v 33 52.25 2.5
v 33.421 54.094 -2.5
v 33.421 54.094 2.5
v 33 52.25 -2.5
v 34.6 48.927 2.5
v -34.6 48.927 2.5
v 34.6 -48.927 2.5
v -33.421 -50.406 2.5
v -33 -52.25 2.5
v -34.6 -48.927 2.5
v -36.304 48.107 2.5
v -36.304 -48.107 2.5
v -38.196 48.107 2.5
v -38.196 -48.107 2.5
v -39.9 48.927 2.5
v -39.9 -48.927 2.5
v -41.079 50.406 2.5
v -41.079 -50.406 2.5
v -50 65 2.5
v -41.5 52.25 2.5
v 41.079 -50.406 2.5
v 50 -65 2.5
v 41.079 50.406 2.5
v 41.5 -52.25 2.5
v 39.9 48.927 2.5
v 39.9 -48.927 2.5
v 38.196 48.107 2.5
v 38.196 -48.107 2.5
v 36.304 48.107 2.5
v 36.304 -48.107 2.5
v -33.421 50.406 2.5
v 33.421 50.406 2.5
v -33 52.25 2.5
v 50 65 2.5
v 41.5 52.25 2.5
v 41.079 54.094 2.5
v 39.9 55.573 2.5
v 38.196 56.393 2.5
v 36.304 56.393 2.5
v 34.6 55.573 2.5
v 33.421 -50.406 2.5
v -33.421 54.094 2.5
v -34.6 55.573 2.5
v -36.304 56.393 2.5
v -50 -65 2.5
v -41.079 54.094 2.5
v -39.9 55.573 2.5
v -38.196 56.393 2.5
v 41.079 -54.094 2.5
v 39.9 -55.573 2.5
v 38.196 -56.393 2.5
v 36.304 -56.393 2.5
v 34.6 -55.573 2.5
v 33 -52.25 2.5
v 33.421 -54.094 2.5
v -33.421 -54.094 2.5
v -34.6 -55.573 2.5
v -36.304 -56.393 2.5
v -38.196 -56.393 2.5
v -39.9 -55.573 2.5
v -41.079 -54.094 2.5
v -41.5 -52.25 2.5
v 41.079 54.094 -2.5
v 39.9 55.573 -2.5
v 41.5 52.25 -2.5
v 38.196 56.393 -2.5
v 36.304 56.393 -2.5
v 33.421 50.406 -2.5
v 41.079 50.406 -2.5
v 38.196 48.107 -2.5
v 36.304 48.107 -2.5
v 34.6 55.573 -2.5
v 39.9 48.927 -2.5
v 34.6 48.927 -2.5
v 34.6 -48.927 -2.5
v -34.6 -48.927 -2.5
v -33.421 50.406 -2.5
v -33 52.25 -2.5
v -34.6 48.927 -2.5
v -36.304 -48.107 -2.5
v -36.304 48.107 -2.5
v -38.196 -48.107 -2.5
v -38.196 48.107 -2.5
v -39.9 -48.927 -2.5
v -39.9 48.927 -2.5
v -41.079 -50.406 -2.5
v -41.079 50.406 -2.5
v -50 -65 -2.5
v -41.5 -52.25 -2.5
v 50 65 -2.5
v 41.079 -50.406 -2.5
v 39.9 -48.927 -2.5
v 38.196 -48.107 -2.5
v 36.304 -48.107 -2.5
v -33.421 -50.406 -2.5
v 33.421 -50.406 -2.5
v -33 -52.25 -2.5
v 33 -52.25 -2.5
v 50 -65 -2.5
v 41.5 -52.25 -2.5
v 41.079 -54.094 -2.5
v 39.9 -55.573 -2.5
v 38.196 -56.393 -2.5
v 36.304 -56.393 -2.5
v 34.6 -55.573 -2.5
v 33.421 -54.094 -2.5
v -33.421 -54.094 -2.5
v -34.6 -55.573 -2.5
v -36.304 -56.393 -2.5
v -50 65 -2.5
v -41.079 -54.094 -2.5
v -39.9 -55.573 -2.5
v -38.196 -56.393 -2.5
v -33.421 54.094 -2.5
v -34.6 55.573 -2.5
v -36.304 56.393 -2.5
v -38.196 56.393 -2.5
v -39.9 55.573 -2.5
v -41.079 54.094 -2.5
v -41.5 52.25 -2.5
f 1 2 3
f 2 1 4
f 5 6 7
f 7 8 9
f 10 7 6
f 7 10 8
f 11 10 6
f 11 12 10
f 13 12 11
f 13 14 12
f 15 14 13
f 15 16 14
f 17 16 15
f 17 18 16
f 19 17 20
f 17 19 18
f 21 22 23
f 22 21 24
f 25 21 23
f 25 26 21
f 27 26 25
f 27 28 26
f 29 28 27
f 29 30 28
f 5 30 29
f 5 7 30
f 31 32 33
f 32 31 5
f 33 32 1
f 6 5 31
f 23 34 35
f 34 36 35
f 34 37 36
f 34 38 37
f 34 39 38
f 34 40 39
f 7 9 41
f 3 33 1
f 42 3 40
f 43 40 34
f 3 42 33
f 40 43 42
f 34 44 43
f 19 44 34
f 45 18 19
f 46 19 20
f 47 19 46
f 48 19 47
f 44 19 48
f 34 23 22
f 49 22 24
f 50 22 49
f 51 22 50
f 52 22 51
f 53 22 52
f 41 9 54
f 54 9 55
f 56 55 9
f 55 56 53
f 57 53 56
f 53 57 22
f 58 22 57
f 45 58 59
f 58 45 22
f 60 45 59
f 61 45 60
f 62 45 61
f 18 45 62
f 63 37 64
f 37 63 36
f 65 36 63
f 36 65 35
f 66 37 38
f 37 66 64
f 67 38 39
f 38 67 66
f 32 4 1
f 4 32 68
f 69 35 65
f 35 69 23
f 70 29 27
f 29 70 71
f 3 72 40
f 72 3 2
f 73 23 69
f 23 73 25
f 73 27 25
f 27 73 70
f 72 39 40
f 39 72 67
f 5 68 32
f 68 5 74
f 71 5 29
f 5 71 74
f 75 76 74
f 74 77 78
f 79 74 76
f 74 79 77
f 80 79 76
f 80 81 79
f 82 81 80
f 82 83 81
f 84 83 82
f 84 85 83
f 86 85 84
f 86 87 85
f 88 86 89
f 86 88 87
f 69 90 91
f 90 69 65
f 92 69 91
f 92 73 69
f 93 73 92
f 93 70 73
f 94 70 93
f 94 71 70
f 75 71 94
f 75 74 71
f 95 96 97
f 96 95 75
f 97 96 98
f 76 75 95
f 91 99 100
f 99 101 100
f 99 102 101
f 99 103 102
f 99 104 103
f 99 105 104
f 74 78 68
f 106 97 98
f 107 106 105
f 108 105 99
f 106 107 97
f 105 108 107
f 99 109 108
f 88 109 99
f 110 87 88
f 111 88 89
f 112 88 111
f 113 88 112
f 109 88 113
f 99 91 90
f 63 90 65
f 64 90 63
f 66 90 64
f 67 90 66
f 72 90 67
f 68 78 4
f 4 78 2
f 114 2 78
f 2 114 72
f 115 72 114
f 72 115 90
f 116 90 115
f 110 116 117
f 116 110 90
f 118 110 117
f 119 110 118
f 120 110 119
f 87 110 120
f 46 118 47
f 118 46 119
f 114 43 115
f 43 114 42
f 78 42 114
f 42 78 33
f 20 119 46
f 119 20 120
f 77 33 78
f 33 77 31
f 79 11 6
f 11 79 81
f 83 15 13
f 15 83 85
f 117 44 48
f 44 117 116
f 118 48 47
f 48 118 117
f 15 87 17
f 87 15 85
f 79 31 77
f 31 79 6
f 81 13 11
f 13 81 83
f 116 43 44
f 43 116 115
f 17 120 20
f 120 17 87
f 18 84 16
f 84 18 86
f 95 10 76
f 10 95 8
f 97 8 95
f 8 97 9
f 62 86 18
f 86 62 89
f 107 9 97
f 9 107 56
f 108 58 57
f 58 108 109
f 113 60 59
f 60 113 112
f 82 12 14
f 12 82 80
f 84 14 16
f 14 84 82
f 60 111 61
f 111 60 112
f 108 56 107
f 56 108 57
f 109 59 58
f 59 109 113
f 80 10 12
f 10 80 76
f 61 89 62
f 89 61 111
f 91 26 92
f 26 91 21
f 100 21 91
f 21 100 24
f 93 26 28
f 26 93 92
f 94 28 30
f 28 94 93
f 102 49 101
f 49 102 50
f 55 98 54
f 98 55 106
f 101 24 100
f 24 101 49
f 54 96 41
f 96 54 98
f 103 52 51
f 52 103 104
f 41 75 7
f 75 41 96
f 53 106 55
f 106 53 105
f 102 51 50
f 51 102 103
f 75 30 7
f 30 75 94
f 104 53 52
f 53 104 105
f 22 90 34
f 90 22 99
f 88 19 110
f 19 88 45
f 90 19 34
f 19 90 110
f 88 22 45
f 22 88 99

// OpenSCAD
// Generated by SolidPython 1.1.3 on 2023-07-11 01:34:08


difference() {
	cube(center = true, size = [100, 130.0000000000, 5]);
	union() {
		translate(v = [37.2500000000, 52.2500000000]) {
			cylinder(center = true, h = 5, r = 4.2500000000);
		}
		translate(v = [-37.2500000000, 52.2500000000]) {
			cylinder(center = true, h = 5, r = 4.2500000000);
		}
		translate(v = [-37.2500000000, -52.2500000000]) {
			cylinder(center = true, h = 5, r = 4.2500000000);
		}
		translate(v = [37.2500000000, -52.2500000000]) {
			cylinder(center = true, h = 5, r = 4.2500000000);
		}
	}
}
/***********************************************
*********      SolidPython code:      **********
************************************************
 
import solid
import numbers
import pudb
from solid.utils import *
import viewscad
import subprocess
import os
import os.path as osp
import math
import sys

chamfer_extrude=solid.import_scad("./chamfer_extrude.scad")
chamfer_extrude=chamfer_extrude.chamfer_extrude
r = viewscad.Renderer(width=800, height=800)

def debug(model,f_name,path="/home/ts/code/projects/mfd/designs/debug"):
    solid.scad_render_to_file(model,osp.join(path,f_name)+".scad")
#generate position list of wells using offset from center
wells_pos_from_center_4 = lambda offset: [[-offset,offset],
                                        [offset, offset],
                                        [-offset, -offset],
                                        [offset, -offset]]
#wells_pos_from_center_2 = lambda offset: [[0,offset],
#                                        [0, -offset]]
wells_pos_from_center_2 = lambda offset: [[offset,0],
                                        [-offset,0]]

def make_well(dims,shape=None,height=None,dxf=False):
    def circle_cylinder():
        if dxf or (height is None):
            well = solid.circle(r=dims, segments=64)
        else:
            well = solid.cylinder(r=dims, h=height, segments=64, center = True)
        return well
    if dims is None:
        sys.exit("radius needs to be a number")
    if isinstance(dims, numbers.Number):
        well =circle_cylinder()
    elif len(dims)==1:
        if isinstance(dims[1], numbers.Number):
            well =circle_cylinder()
        else:
            sys.exit("radius needs to be a number")
    elif len(dims)==2:
        well = solid.square(dims,center = True)
    elif len(dims)==3:
        well = solid.cube(dims, center = True)
    return well

def wells_top_bottom(center_gap,device_dims=None,shape=None,height=None, positions = None, dxf = False):
    well_shape = make_well(device_dims,shape=shape,height=height,dxf=dxf)
    wells = []
    if positions is None:
        offset = radius+radius/2.0
        positions = wells_pos_from_center_2(offset)
    if dxf or (height is None):
        height = 0
    for position in positions:
        if dxf:
            wells.append(solid.translate([position[0],position[1]])(well_shape))
        else:
            wells.append(solid.translate([position[0],position[1],height/2.0])(well_shape))
    return  union()(*wells)

#place wells in four corners 
def four_corner(radius,height=None, positions = None, dxf = False):
    #if well pos not specified set
    #to equally spaced by half radius
    if positions is None:
        offset = radius+radius/2.0
        positions = wells_pos_from_center_4(offset)
    if dxf or (height is None):
        height = 0
    #make wells at positions with specified radius and height
    wells = []
    for position in positions:
        #make circle if making dxf
        if dxf:
            well_shape = solid.circle(r=radius, segments=64)
            well_shape = solid.translate([position[0],position[1]])(well_shape)
        #if stl make cylinder
        else:
            well_shape = solid.cylinder(r=radius, h=height, segments=64, center = True)
            well_shape = solid.translate([position[0],position[1],height/2.0])(well_shape)
        wells.append(well_shape)
    return  union()(*wells)

#generate channels 
def make_channels(length,width,height=0,num_chans=1,max_chans=None,spacing=None, dxf = False,
                  rotate_channels=False):
    if dxf or (height is None):
        height = 0
    #if channel gap not defined, is equal to
    if spacing is None: spacing = width
    #calculate number of channels if fitting max num within given width
    if not max_chans is None:
        import math
        num_chans = math.floor((max_chans-spacing)/(width+spacing))
    #get total width of channel section  
    total_width = (width*num_chans)+(spacing*(num_chans-1))

    #make template channel
    #if rotate_channels: width, length = length, width
    if dxf:
        channel_t = solid.square([length,width],center = True)
    else:
        channel_t = solid.cube([length,width,height], center = True)

    #if number channels is even, offset the first channel to center its gap
    if num_chans % 2 == 0: centering = -(width/2.0+spacing/2.0)
    else: centering = 0
    #move template channel up to align bottom at z = 0 
    #and offset center if necessary
    if dxf:
        channel_t = solid.translate([0,centering])(channel_t)
    else:
        channel_t = solid.translate([0,centering,height/2.0])(channel_t)

    #if rotate_channels: length,width = width,length
    #start making the channels
    channels = []
    for i in range(num_chans):
        #if i=0 there is no translation
        #if i=1, we make the first channel adjacent to second
        direction = i

        #if i>=1, we add channels alternating left and right
        if i >= 1:
            direction = -(i/2.0)
            if i % 2 == 1: direction = (-direction)+0.5
                
        #make channel at right position and add it to channel list
        translation_coords = [0,direction*(width+spacing)]
        #if rotate_channels: translation_coords = [direction*(width+spacing),0]
        if dxf:
            channel = solid.translate(translation_coords)(channel_t)
        else:
            channel = solid.translate([*translation_coords,0])(channel_t)
        channels.append(channel)
    
    #group all channels as one object
    channels = union()(*channels)
    #compute the x,y,z dimensions in order to pass as arguments 
    #for construction of other parts of device (such as the chambers)
    measurements = {'x':(length/2.0,-length/2.0),
                    'y':(total_width/2.0,-total_width/2.0)}
    if not dxf:
        measurements['z'] = (height,0)
    if rotate_channels:
        channels = solid.rotate(90)(channels)
        measurements['x'],measurements['y']=measurements['y'],measurements['x']
    return channels,measurements

def make_chambers(msrs,height=None,extra=0,len_until=None,width=None, dxf = False):
    #computes x,y,z length
    total = lambda x : abs(x[0]) + abs(x[1])
    
    #if specific height if specified
    #otherwise use same height as channels
    if dxf:
        pass
    elif not height is None:
        msrs['z'] = (height,0)
    else:
        msrs['z'] = (0,0)
        
    #make copy of measurements from channels to modify chamber dimensions 
    #and add length to chambers as specified
    chamber_dims = msrs.copy()
    #calculate length of chamber to reach specified offset
    if not len_until is None:
        chamber_len = len_until-(msrs['x'][0])
    #or add specified length to channel length (if not specified, adds 0)
    else:
        chamber_len = msrs['x'][0]+extra
    #set the chamber length based 
    chamber_dims['x'] = (chamber_len/2.0,-(chamber_len/2.0))
    #compute final dimensions of chamber
    if not width is None:
        chamber_dims['y'] = (width/2.0,-width/2.0)
    chamber_dims = [total(size) for size in chamber_dims.values()]
        
    #calculate chamber translation offset to place adjacent to channels
    chamber_trslt = msrs['x'][0]+(chamber_len/2.0)
    #compute chamber translation coordinates to align with channels
    #x = 1 moves chamber above channels
    #x = -1 moves chamber below channels
    if dxf:
        trslt = lambda x : [x*(chamber_trslt),0]
    else:
        trslt = lambda x : [x*(chamber_trslt),0,msrs['z'][0]/2.0]
    
    #function to make chamber at top or at bottom 
    if dxf:
        move = lambda x : solid.translate(trslt(x))(solid.square(chamber_dims, center = True) )
    else:
        move = lambda x : solid.translate(trslt(x))(solid.cube(chamber_dims,center = True))
    #make top and bottom chambers and return them as grouped
    top = move(1)
    bottom = move(-1)
    #chambers=solid.rotate(90)(solid.union()(top,bottom))
    chambers=(solid.union()(top,bottom))

    return chambers

#create alignment features 
def alignment_features(unit,dims,grid_size, mask_size = None, alignment = "hollow", units_from_center = (2.5,2.5), corner_len=None):
    width = grid_size[0]*dims[0]
    length = grid_size[1]*dims[1]
    if mask_size is None and corner_len is None:
        corner_len = (dims[0] + dims[1]) /2 / 8
    corner = lambda thickness_div : solid.union()( solid.square([corner_len,corner_len/thickness_div],center=False), solid.square([corner_len/thickness_div,corner_len],center=False) )
    
    def make_full(thickness_div):
        thickness = corner_len/thickness_div
        tr = solid.translate([0, 0, 0 ])(solid.rotate(180)(corner(thickness_div)))
        tr = solid.translate([thickness/2,thickness/2,0])(tr)
        bl = solid.translate([0, 0, 0 ])(solid.rotate(0)(corner(thickness_div)))
        bl = solid.translate([-thickness/2,-thickness/2,0])(bl)
        return solid.union()(tr,bl)
    
    def make_hollow(thickness_div):
        thickness = corner_len/(thickness_div/2)
        inner = make_full(thickness_div)
        outer = make_full(thickness_div/2)
        hollow = outer - inner 
        return hollow
    
    center = (width /2 , length/2)
    mask_pos = lambda x,y : (center[0] + x*(float(units_from_center[0])*dims[0]), center[1] + y*(float(units_from_center[1])*dims[1]))
    positions = []
    positions.append(mask_pos(1,0))
    positions.append(mask_pos(0,1))
    positions.append(mask_pos(-1,0))
    positions.append(mask_pos(0,-1))
    make_mask = lambda mtype : make_hollow(8) if mtype == "hollow" else make_full(8)
    masks = [ solid.translate([*position,0])(make_mask(alignment)) for position in positions]
    
    solid.scad_render_to_file(solid.union()(*masks),"./designs/open_chamber/masks.scad")
    #return unit - solid.union()(*masks)
    return solid.union()(*masks,unit)

def create_outline(thickness, array, dims, grid_size,):
    width = grid_size[0]*dims[0] + thickness *2
    length = grid_size[1]*dims[1] + thickness *2
    outer = solid.translate([-thickness, -thickness,0])(solid.square([width, length]))
    return outer-array

def create_wall(wall_thickness, outline_thickness, dims, grid_size, wall_height = 2000, dxf = False):
    inner_width = grid_size[0]*dims[0] + outline_thickness *2
    inner_length = grid_size[1]*dims[1] + outline_thickness *2
    outer_width = inner_width + wall_thickness * 2
    outer_length = inner_length + wall_thickness * 2
    outer_pos_x = -outline_thickness-wall_thickness
    outer_pos_y = -outline_thickness-wall_thickness
    inner_pos_x = -outline_thickness
    inner_pos_y = -outline_thickness
    if dxf:
        inner_wall = solid.translate([inner_pos_x,
                                      inner_pos_y,
                                      0])(solid.square([inner_width, inner_length]))
        outer_wall = solid.translate([outer_pos_x,
                                      outer_pos_y,
                                      0])(solid.square([outer_width, outer_length]))

        return outer_wall-inner_wall
    else:
        inner_wall = solid.translate([inner_pos_x,
                                      inner_pos_y,
                                      0])(solid.cube([inner_width, inner_length,wall_height]))
        outer_wall = solid.translate([outer_pos_x,
                                      outer_pos_y,
                                      0])(solid.cube([outer_width, outer_length,wall_height]))

        return outer_wall-inner_wall, {'wall_height': wall_height,
                                       'wall_thickness': wall_thickness,
                                       'inner_width':inner_width,
                                       'inner_length': inner_length,
                                       'outer_width': outer_width,
                                       'outer_length': outer_length,
                                       'outer_pos_x' : outer_pos_x,
                                       'outer_pos_y' : outer_pos_y,
                                       'inner_pos_x' : inner_pos_x,
                                       'inner_pos_y' : inner_pos_y}

def create_thicker_wall(wall_thickness, outer_wall_offset, wall_dims, dims, grid_size, height_start = .2, height_end=2, dxf = False):
    addon_wall,thicker_wall_dims = create_wall(wall_thickness, outer_wall_offset, dims, grid_size, wall_height=height_end-height_start, dxf = False)
    addon_wall = solid.translate([0,0,height_start])(addon_wall)

    thicker_wall_dims['wall_height'] = height_end
    thicker_wall_dims['wall_thickness'] = wall_dims['wall_thickness'] + wall_thickness
    return addon_wall, thicker_wall_dims
 
def add_lock_to_wall(wall,wall_dims,y_offset = 0,cut_ratio=0.7,L_length=3, gap_ratio=0.05, axis="x",width_ratio=1/2):
    # Makes L shape
    def make_L(max_length,length_thickness,max_width,width_thickness,height,y_offset):
        length = solid.cube([max_length,length_thickness,height])
        width = solid.cube([width_thickness,max_width,height])
        width = solid.translate([max_length-(width_thickness),0,0])(width)
        L = solid.union()(width,length)
        debug(L,"L")
        if axis == "x":
            L = solid.rotate(-90)(L)
            L = solid.translate([0,max_length,0])(L)
        else:
            L = solid.rotate(-180)(L)
            L = solid.translate([max_length,max_width,0])(L)
        return solid.translate([0,0,y_offset])(L)
    
    lock_length = L_length
    lock_width = wall_dims['wall_thickness']*width_ratio
    lock_length_thickness = lock_width/2
    lock_width_thickness = lock_width/2
    L_lock = make_L(lock_length,lock_length_thickness,lock_width,lock_width_thickness, wall_dims['wall_height']-y_offset, y_offset)
    
    margin_space = lock_length - lock_length*(1-gap_ratio)
    key_length = lock_length-margin_space
    key_length_thickness = lock_length_thickness-(margin_space*2)
    key_width = lock_width-(margin_space*2)
    key_width_thickness = lock_width_thickness-(margin_space*2)
    L_key = make_L(key_length,key_length_thickness,key_width,key_width_thickness, wall_dims['wall_height']-y_offset, y_offset)
    L_key = solid.translate([margin_space,margin_space,0])(L_key)
    L = solid.union()(L_lock,L_key)
    debug(L,"L")
    
    #Make cube to be used as negative to split frame in a half
    #Can choose if making left or right negative, specify ratio of split
    def make_negative(right,cut_ratio):
        if axis == "x":
            if right:
                length = wall_dims['outer_length']*(1-cut_ratio)
                pos_x = wall_dims['outer_pos_x']+(wall_dims['outer_length']*cut_ratio)
            else:
                length = wall_dims['outer_length']*(cut_ratio)
                pos_x = wall_dims['outer_pos_x'] 
            negative = solid.cube([wall_dims['outer_width'],length, wall_dims['wall_height']])
            negative = solid.translate([wall_dims['outer_pos_y'],pos_x,0])(negative)
        else:
            if right:
                length = wall_dims['outer_width']*(1-cut_ratio)
                pos_x = wall_dims['outer_pos_y']+(wall_dims['outer_width']*cut_ratio)
            else:
                length = wall_dims['outer_width']*(cut_ratio)
                pos_x = wall_dims['outer_pos_y'] 
            negative = solid.cube([length,wall_dims['outer_length'], wall_dims['wall_height']])
            negative = solid.translate([pos_x,wall_dims['outer_pos_x'],0])(negative)
        return negative, pos_x, length 
                      
    #Make negatives
    negative_right, right_half_pos_x, right_half_length = make_negative(True,cut_ratio)
    negative_left, left_half_pos_x, right_half_length = make_negative(False,cut_ratio)
    #Make halves
    left_half = solid.difference()(wall,negative_right)
    right_half = solid.difference()(wall,negative_left)
    def place_L(L, L_length,L_width):
        #Place L on top wall       
        offset_to_center = (wall_dims['wall_thickness']-L_width)/2
        if axis == "x":
            y_pos_top = (wall_dims['outer_pos_y'] +
                    wall_dims['outer_width'] - 
                    L_width - offset_to_center)
            top_L = solid.translate([y_pos_top,
                                     right_half_pos_x-(L_length),
                                     0])(L)
            #Place L on bottom wall       
            y_pos_bottom = wall_dims['outer_pos_y']+offset_to_center
            bottom_L = solid.translate([y_pos_bottom,
                                        right_half_pos_x-L_length,
                                        0])(L)
        else:
            y_pos_top = (wall_dims['outer_pos_x'] +
                    wall_dims['outer_length'] -
                    (L_width+offset_to_center))
            top_L = solid.translate([right_half_pos_x-L_length,
                                     y_pos_top,
                                     0])(L)
            #Place L on bottom wall       
            y_pos_bottom = wall_dims['outer_pos_y']+offset_to_center
            bottom_L = solid.translate([right_half_pos_x-L_length,
                                        y_pos_bottom,
                                        0])(L)
        return bottom_L, top_L
    #Make complimentary L pieces through union and differences
    #Make Lock
    bottom_L_lock, top_L_lock = place_L(L_lock,L_length,lock_width)
    left_half = solid.difference()(left_half,bottom_L_lock)
    left_half = solid.difference()(left_half,top_L_lock)
    #Make Key
    bottom_L_key, top_L_key = place_L(L_key,L_length,lock_width)
    right_half = solid.union()(right_half,bottom_L_key)
    right_half = solid.union()(right_half,top_L_key)
    return left_half, right_half


#build a row x col grid of containment units
def make_unit_array(unit,dims,grid_size, dxf = False, alignment = None, mask_size = None,
                    units_from_center = None,alignment_offset=None, alignment_mark_size=1):
    units = []
    for col in range(grid_size[1]):
        for row in range(grid_size[0]):
            if dxf:
                units.append(solid.translate([row*dims[0],col*dims[1]])(unit))
            else:
                units.append(solid.translate([row*dims[0],col*dims[1],dims[2]/2.0])(unit))
    array = solid.union()(*units)
    if (not alignment is None) and dxf:
        if not alignment_offset is None:
            array = solid.translate([alignment_offset[0],alignment_offset[1]])(array)
        array = alignment_features(array,dims, grid_size, alignment = alignment, mask_size = None, units_from_center = units_from_center,corner_len=alignment_mark_size)
        if not alignment_offset is None:
            array = solid.translate([-alignment_offset[0],-alignment_offset[1]])(array)
    return array


def make_taylor(wells_pos = wells_pos_from_center_4(2.25), well_rad = 1.5 ,
                well_height = 2, chan_w = 0.01, chan_l = 1, chan_h = 0.010 ,
                chan_gap = 0.040, max_chans = None,num_chans=100, chamber_height  = 0.100,
                columns = 1, rows = 1, chamber_len_until=2.25, add_channels = True, add_wells = True, 
                add_chambers = True, save_path = "./", alignment = None, units_from_center = 2,
                mask_size = None, render_stl = False, outline_thickness = 0.050, dxf = True,
                wall_height = 15, wall_thickness = 0.95, casing_x=9, casing_y=9, casing_z=0,rotate_units=0):

    dims = [casing_x, casing_y, casing_z]
    wells = four_corner(well_rad,well_height, dxf = dxf, positions = wells_pos)
    debug(wells,"wells")
    channels, msrs = make_channels(chan_l,chan_w,chan_h,dxf=dxf, spacing = chan_gap, max_chans=max_chans,num_chans=num_chans)
    debug(channels,"channels")
    chambers = make_chambers(msrs,dxf = dxf, height=chamber_height,len_until=chamber_len_until)
    debug(chambers,"chambers")

    #add together and render
    device_parts = []
    if add_channels:
        device_parts.append(channels)
    if add_wells:
        device_parts.append(wells)
    if add_chambers:
        device_parts.append(chambers)
    device=union()(*device_parts)
    device = rotate(rotate_units)(device)

    device=solid.translate([dims[0]/2.0,dims[1]/2.0,0])(device)
    channels = rotate(rotate_units)(channels)
    channels=solid.translate([dims[0]/2,dims[1]/2,0])(channels)
    chambers_wells = union()(wells,chambers)
    chambers_wells = rotate(rotate_units)(chambers_wells)
    chambers_wells=solid.translate([dims[0]/2,dims[1]/2,0])(chambers_wells)

    file_name = str(rows)+'x'+str(columns)+'_units_'
    grid_size = [rows,columns]

    if alignment:
        alignment="full"
    device = make_unit_array(device,dims,grid_size, dxf=dxf, alignment = alignment,
                                 units_from_center = units_from_center)
    channels = make_unit_array(channels,dims,grid_size, dxf=dxf, alignment = alignment,
                                 units_from_center = units_from_center)
    if alignment=="full":
        alignment="hollow"

    chambers_wells = make_unit_array(chambers_wells,dims,grid_size, dxf=dxf, alignment = alignment,
                                 units_from_center =units_from_center)

    def save_model(model,prefix):
        model_fname = os.path.abspath(save_path+prefix+"_"+file_name+".scad")
        solid.scad_render_to_file(model,model_fname)
        return model_fname

    wells_fname = save_model(wells,"wells")
    channels_fname = save_model(channels,"channels")
    device_fname = save_model(device,"device")
    chambers_wells_fname = save_model(chambers_wells,"chambers_wells")
    return (chambers_wells,chambers_wells_fname), (channels,channels_fname), (device,device_fname)

def make_device(design='open',rows=8,columns=6,wells_pos = 4.5,well_offset=3.2, well_rad=3.2,well_height=0.1,
                chan_l=1,chan_w=0.01,chan_h=0.01,chan_gap=0.015,num_chans=101,dxf=True,save_path="./designs/open_chamber/",
                casing_x=9.0,casing_y=18.0,casing_z=0,rotate_units=90,units_from_center=(3,1),chamber_len_until=4.5,
                chamber_width=None,alignment=True, add_wells=True, add_channels=True,add_chambers=True):

    dims = [casing_x, casing_y, casing_z]
    if design == "open":
        wells_pos=wells_pos_from_center_2(wells_pos)
        wells = wells_top_bottom(well_offset*2,device_dims=well_rad,height=well_height, dxf = dxf, positions = wells_pos)
    elif design == "closed":
        wells_pos=wells_pos_from_center_4(wells_pos)
        debug(wells,"wells")
        wells = four_corner(well_offset,well_heightdevice_dims=well_rad, dxf = dxf, positions = wells_pos)
    else:
        print(design+" is not a valid design.\n Choose valid design: 'open' or 'closed'")
        exit()
    wells = rotate(rotate_units)(wells)
    wells=solid.translate([dims[0]/2,dims[1]/2,0])(wells)
    debug(wells,"wells")

    channels, msrs = make_channels(chan_l,chan_w,chan_h,dxf=dxf, spacing = chan_gap, num_chans=num_chans,rotate_channels=False)
    channels = rotate(rotate_units)(channels)
    channels=solid.translate([dims[0]/2,dims[1]/2,0])(channels)

    chambers=make_chambers(msrs,height=None,extra=0,len_until=chamber_len_until, width=chamber_width,dxf = dxf)
    chambers = rotate(rotate_units)(chambers)
    chambers=solid.translate([dims[0]/2,dims[1]/2,0])(chambers)

    device_parts = []
    if add_channels:
        device_parts.append(channels)
    if add_wells:
        device_parts.append(wells)
    if add_chambers:
        device_parts.append(chambers)
    device = union()(*device_parts)
    #device = rotate(rotate_units)(device)
    #device=solid.translate([dims[0]/2.0,dims[1]/2.0,0])(device)

    chambers_wells = []
    if add_chambers:
        chambers_wells.append(chambers)
    if add_wells:
        chambers_wells.append(wells)
    chambers_wells = union()(*chambers_wells)
    #chambers_wells = union()(wells,chambers)
    #chambers_wells = rotate(rotate_units)(chambers_wells)
    #chambers_wells=solid.translate([dims[0]/2,dims[1]/2,0])(chambers_wells)

    file_name = str(rows)+'x'+str(columns)+'_units_'

    grid_size = [rows,columns]
    if alignment:
        alignment="full"
    device = make_unit_array(device,dims,grid_size, dxf=dxf, alignment = alignment,
                                 units_from_center = units_from_center)
    channels = make_unit_array(channels,dims,grid_size, dxf=dxf, alignment = alignment,
                                 units_from_center = units_from_center)
    if alignment=="full":
        alignment="hollow"

    chambers_wells = make_unit_array(chambers_wells,dims,grid_size, dxf=dxf, alignment = alignment,
                                 units_from_center =units_from_center)

    def save_model(model,prefix):
        model_fname = os.path.abspath(save_path+prefix+"_"+file_name+".scad")
        solid.scad_render_to_file(model,model_fname)
        return model_fname

    wells_fname = save_model(wells,"wells")
    channels_fname = save_model(channels,"channels")
    device_fname = save_model(device,"device")
    chambers_wells_fname = save_model(chambers_wells,"chambers_wells")
    return (chambers_wells,chambers_wells_fname), (channels,channels_fname), (device,device_fname)


def make_open_chamber(rows=8,columns=6,wells_pos = wells_pos_from_center_2(4.5), well_rad=3.2,well_height=0.1,
                      chan_l=1,chan_w=0.01,chan_h=0.01,chan_gap=0.015,num_chans=101,dxf=True,save_path="./designs/open_chamber/",
                      casing_x=9.0,casing_y=18.0,casing_z=0,rotate_units=90,units_from_center=(3,1),chamber_len_until=4.5,
                      chamber_width=None,alignment=True, add_wells=True, add_channels=True,add_chambers=True):

    dims = [casing_x, casing_y, casing_z]
    wells = wells_top_bottom(well_rad,height=well_height, dxf = dxf, positions = wells_pos)
    channels, msrs = make_channels(chan_l,chan_w,chan_h,dxf=dxf, spacing = chan_gap, num_chans=num_chans,rotate_channels=False)
    chambers=make_chambers(msrs,height=None,extra=0,len_until=chamber_len_until, width=chamber_width,dxf = dxf)
    debug(chambers,"chambers")
    device_parts = []
    if add_channels:
        device_parts.append(channels)
    if add_wells:
        device_parts.append(wells)
    if add_chambers:
        device_parts.append(chambers)
    device = union()(*device_parts)
    device = rotate(rotate_units)(device)
    device=solid.translate([dims[0]/2.0,dims[1]/2.0,0])(device)
    channels = rotate(rotate_units)(channels)
    channels=solid.translate([dims[0]/2,dims[1]/2,0])(channels)
    chambers_wells = union()(wells,chambers)
    chambers_wells = rotate(rotate_units)(chambers_wells)
    chambers_wells=solid.translate([dims[0]/2,dims[1]/2,0])(chambers_wells)

    file_name = str(rows)+'x'+str(columns)+'_units_'

    grid_size = [rows,columns]
    if alignment:
        alignment="full"
    device = make_unit_array(device,dims,grid_size, dxf=dxf, alignment = alignment,
                                 units_from_center = units_from_center)
    channels = make_unit_array(channels,dims,grid_size, dxf=dxf, alignment = alignment,
                                 units_from_center = units_from_center)
    if alignment=="full":
        alignment="hollow"

    chambers_wells = make_unit_array(chambers_wells,dims,grid_size, dxf=dxf, alignment = alignment,
                                 units_from_center =units_from_center)

    def save_model(model,prefix):
        model_fname = os.path.abspath(save_path+prefix+"_"+file_name+".scad")
        solid.scad_render_to_file(model,model_fname)
        return model_fname

    wells_fname = save_model(wells,"wells")
    channels_fname = save_model(channels,"channels")
    device_fname = save_model(device,"device")
    chambers_wells_fname = save_model(chambers_wells,"chambers_wells")
    return (chambers_wells,chambers_wells_fname), (channels,channels_fname), (device,device_fname)

def to_dxf(scad_path):
    dxf_path = scad_path.replace(".scad",".dxf")
    subprocess.call(["openscad", "-o", dxf_path, scad_path])
    import ezdxf
    temp_dxf = ezdxf.readfile(dxf_path)
    temp_dxf.saveas(dxf_path)

#def make_walls(diameter,thickness,grid_size,dims,height=20,segments=256,make_inner=True):
#    wafer_wall_out = solid.cylinder(r=diameter/2,h=height, segments=segments)
#    wafer_wall_in = solid.cylinder(r=(diameter/2-thickness),h=height, segments=segments)
#    wafer_wall = solid.difference()(wafer_wall_out,wafer_wall_in)
#    wafer_wall = solid.translate([grid_size[1]*dims[1]/2.0,grid_size[0]*dims[0]/2.0])(wafer_wall)
#
#    vertical_wall_length = grid_size[1]*dims[1]
#    horizontal_wall_length = grid_size[0]*dims[0]
#    vertical_wall = solid.cube([vertical_wall_length,thickness,height],center = True)
#    vertical_wall = solid.translate([vertical_wall_length/2,0,height/2])(vertical_wall)
#    horizontal_wall = solid.cube([thickness,horizontal_wall_length,height],center = True)
#    horizontal_wall = solid.translate([0,vertical_wall_length/2,height/2])(horizontal_wall)
#    walls = []
#    walls.append(horizontal_wall)
#    walls.append(vertical_wall)
#    for col in range(grid_size[1]):
#        if col == grid_size[1]-1: 
#            walls.append(solid.translate([0,(col+1)*dims[1]])(vertical_wall))
#        elif col > 0 and col < grid_size[1]-1 and make_inner==True:
#            walls.append(solid.translate([0,(col+1)*dims[1]])(vertical_wall))
#    for row in range(grid_size[0]):
#        if row == grid_size[0]-1: 
#            walls.append(solid.translate([(row+1)*dims[0],0])(horizontal_wall))
#        elif row > 0 and row < grid_size[0]-1 and make_inner==True:
#            walls.append(solid.translate([(row+1)*dims[0],0])(horizontal_wall))
#    walls = union()(*walls)
#    wafer_walls = union()(walls,wafer_wall)
#    return walls,wafer_wall,wafer_walls

def make_walls(diameter,thickness,grid_size,dims,height=20,segments=256,make_inner=True,padx=0,pady=0):
    wafer_wall_out = solid.cylinder(r=diameter/2,h=height, segments=segments)
    wafer_wall_in = solid.cylinder(r=(diameter/2-thickness),h=height, segments=segments)
    wafer_wall = solid.difference()(wafer_wall_out,wafer_wall_in)
    wafer_wall = solid.translate([grid_size[1]*dims[1]/2.0,grid_size[0]*dims[0]/2.0])(wafer_wall)

    vertical_wall_length = grid_size[0]*dims[0]+padx
    horizontal_wall_length = grid_size[1]*dims[1]+pady
    vertical_wall = solid.cube([vertical_wall_length,thickness,height],center = True)
    vertical_wall = solid.translate([vertical_wall_length/2-pady/2,-padx/2,height/2])(vertical_wall)
    horizontal_wall = solid.cube([thickness,horizontal_wall_length,height],center = True)
    horizontal_wall = solid.translate([-pady/2,horizontal_wall_length/2-padx/2,height/2])(horizontal_wall)
    walls = []
    walls.append(horizontal_wall)
    walls.append(vertical_wall)
    for col in range(grid_size[1]):
        if col == grid_size[1]-1: 
            walls.append(solid.translate([0,(col+1)*dims[1]+pady])(vertical_wall))
        elif col > 0 and col < grid_size[1]-1 and make_inner==True:
            walls.append(solid.translate([0,(col+1)*dims[1]])(vertical_wall))
    for row in range(grid_size[0]):
        if row == grid_size[0]-1: 
            walls.append(solid.translate([(row+1)*dims[0]+padx,0])(horizontal_wall))
        elif row > 0 and row < grid_size[0]-1 and make_inner==True:
            walls.append(solid.translate([(row+1)*dims[0],0])(horizontal_wall))
    walls = union()(*walls)
    wafer_walls = union()(walls,wafer_wall)
    return walls,wafer_wall,wafer_walls

def save_model(model,base_path,base_name,dxf=True):
    if not os.path.exists(base_path):
        os.makedirs(base_path)
    dxf_path=osp.join(base_path,base_name+".scad")
    solid.scad_render_to_file(model,osp.join(dxf_path))
    if dxf:
        to_dxf(dxf_path)

def make_wafer(diameter,flat_len,thickness):
    wafer = solid.cylinder(r1=diameter/2,r2=diameter/2,h=thickness,segments=512,)()
    x_start_flat=(flat_len/2)
    y_start_flat = math.sqrt(((diameter/2)**2) - (x_start_flat**2) )
    height_delete_flat=diameter/2-y_start_flat
    flat_delete = solid.cube([flat_len,height_delete_flat,thickness],center=False)()
    flat_delete = solid.translate([-flat_len/2,y_start_flat,0])(flat_delete)
    wafer = solid.difference()(wafer,flat_delete)
    wafer = solid.rotate(90)(wafer)
    return wafer

def add_wafer_to_mask(wafer_size,flat_len,mask,grid_size,dims,wafer_line_thickness=0.1,outer_mask_thickness=5,alignment_offset=None):
    def make_wafer_mask(wafer_size,flat_len):
        wafer_mask = make_wafer(wafer_size,flat_len,1)
        wafer_mask = solid.projection()(wafer_mask)
        wafer_mask = solid.translate([grid_size[0]*dims[0]/2.0,grid_size[1]*dims[1]/2.0])(wafer_mask)
        if not alignment_offset is None:
            wafer_mask = solid.translate([-alignment_offset[0],-alignment_offset[1]])(wafer_mask)
        return wafer_mask

    inner_wafer_line_mask = make_wafer_mask(wafer_size-wafer_line_thickness/2,flat_len)
    outer_wafer_line_mask = make_wafer_mask(wafer_size+wafer_line_thickness/2,flat_len)
    outer_wafer_mask = make_wafer_mask(wafer_size+outer_mask_thickness,flat_len)
    outer_wafer_mask = solid.difference()(outer_wafer_mask,outer_wafer_line_mask)
    wafer_mask = solid.union()(outer_wafer_mask,inner_wafer_line_mask)

    return solid.difference()(wafer_mask,mask)

def make_posts(post_shape,post_height):
    posts = solid.linear_extrude(height=post_height)(post_shape)
    return posts

def make_wafer_empty(diameter,flat_len,thickness,margin,notch_len=20,notch_height=5,oversize=1.01):
    diameter*=oversize
    flat_len*=oversize
    wafer = make_wafer(diameter,flat_len,thickness)
    holder = solid.cylinder(r1=diameter/2+margin,r2=diameter/2+margin,h=thickness,segments=512)()
    holder = solid.difference()(holder,wafer)

    x_start_flat=(flat_len/2)
    y_start_flat = math.sqrt(((diameter/2)**2) - (x_start_flat**2) )
    height_delete_flat=diameter/2-y_start_flat
    notch = solid.cube([notch_len,notch_height,thickness],center=False)()
    notch = solid.translate([-notch_len/2,y_start_flat,0])(notch)
    notch = solid.rotate(90)(notch)
    return solid.difference()(holder,notch)

def wafer_print_calibration(diameter,thickness,height,z_offset):
    circles = []
    radii = []
    radii.append(diameter/2.0*0.8)
    radii.append(diameter/2.0*0.6)
    radii.append(diameter/2.0*0.4)
    radii.append(diameter/2.0*0.2)
    for radius in radii:
        inner = solid.cylinder(r1=radius-(thickness/2.0),r2=radius-(thickness/2.0),h=thickness,segments=512,)()
        outer = solid.cylinder(r1=radius+(thickness/2.0),r2=radius+(thickness/2.0),h=thickness,segments=512,)()
        diff = solid.difference()(outer,inner)
        circles.append(diff)
    circles = solid.union()(*circles)
    circles = solid.translate([0,0,z_offset])(circles)
    return circles

def make_rack(wells,dims,grid_size,alignment_offset,rack_x,rack_y,rack_thickness,bolt_width,add_bolts=True):

    #get X and Y dimensions of gride of pipette tips
    X_len = dims[0]*grid_size[0]
    Y_len = dims[1]*grid_size[1]
    #make rack
    rack = solid.cube([rack_x,rack_y,rack_thickness],center=True)

    if add_bolts:
    #add bolt holes
        bolt_hole=solid.cylinder(r=bolt_width/2,h=rack_thickness,center=True)()
        bolt_holes = []
        bolt_holes.append(solid.translate([rack_x/2-1.5*bolt_width,rack_y/2-1.5*bolt_width])(bolt_hole))
        bolt_holes.append(solid.translate([-rack_x/2+1.5*bolt_width,rack_y/2-1.5*bolt_width])(bolt_hole))
        bolt_holes.append(solid.translate([-rack_x/2+1.5*bolt_width,-rack_y/2+1.5*bolt_width])(bolt_hole))
        bolt_holes.append(solid.translate([rack_x/2-1.5*bolt_width,-rack_y/2+1.5*bolt_width])(bolt_hole))
        bolt_holes = solid.union()(*bolt_holes)
        rack=solid.difference()(rack,bolt_holes)
    rack_support = rack

    #center rack with pipette holes
    rack = solid.translate([0,0,rack_thickness/2])(rack)
    rack = solid.translate([X_len/2,Y_len/2])(rack)
    rack = solid.translate([-alignment_offset[0],-alignment_offset[1]])(rack)
    wells = solid.linear_extrude(height=rack_thickness)(wells)
    rack = solid.difference()(rack,wells)
    return rack, rack_support

def make_pillar(wells,dims,grid_size,alignment_offset,rack_x,rack_y,pillar_height,rack_thickness,bolt_width,add_bolts=True,taper_angle=1,bolt_position_corner=1.5):

    #get X and Y dimensions of gride of pipette tips
    X_len = dims[0]*grid_size[0]
    Y_len = dims[1]*grid_size[1]
    #make rack
    rack = solid.cube([rack_x,rack_y,rack_thickness],center=True)
    
    if add_bolts:
    #add bolt holes
        bolt_hole=solid.cylinder(r=bolt_width/2,h=rack_thickness,center=True)()
        bolt_holes = []
        bolt_holes.append(solid.translate([rack_x/2-bolt_position_corner*bolt_width,rack_y/2-bolt_position_corner*bolt_width])(bolt_hole))
        bolt_holes.append(solid.translate([-rack_x/2+bolt_position_corner*bolt_width,rack_y/2-bolt_position_corner*bolt_width])(bolt_hole))
        bolt_holes.append(solid.translate([-rack_x/2+bolt_position_corner*bolt_width,-rack_y/2+bolt_position_corner*bolt_width])(bolt_hole))
        bolt_holes.append(solid.translate([rack_x/2-bolt_position_corner*bolt_width,-rack_y/2+bolt_position_corner*bolt_width])(bolt_hole))
        bolt_holes = solid.union()(*bolt_holes)
        rack=solid.difference()(rack,bolt_holes)
    rack_support = rack

    #center rack with pipette holes
    #rack = solid.translate([0,0,-rack_thickness])(rack)
    rack = solid.translate([X_len/2,Y_len/2])(rack)
    rack = solid.translate([-alignment_offset[0],-alignment_offset[1]])(rack)
    if not taper_angle == 0:
        wells=chamfer_extrude(pillar_height,taper_angle,segments=20)(wells)
    else:
        wells = solid.linear_extrude(height=pillar_height)(wells)
    rack = solid.union()(rack,wells)
    return rack, rack_support

def deg_taper_len(height,deg):
    if not deg == 0:
        return height*math.tan(math.radians(deg))
    else:
        return 0









 
 
************************************************/
